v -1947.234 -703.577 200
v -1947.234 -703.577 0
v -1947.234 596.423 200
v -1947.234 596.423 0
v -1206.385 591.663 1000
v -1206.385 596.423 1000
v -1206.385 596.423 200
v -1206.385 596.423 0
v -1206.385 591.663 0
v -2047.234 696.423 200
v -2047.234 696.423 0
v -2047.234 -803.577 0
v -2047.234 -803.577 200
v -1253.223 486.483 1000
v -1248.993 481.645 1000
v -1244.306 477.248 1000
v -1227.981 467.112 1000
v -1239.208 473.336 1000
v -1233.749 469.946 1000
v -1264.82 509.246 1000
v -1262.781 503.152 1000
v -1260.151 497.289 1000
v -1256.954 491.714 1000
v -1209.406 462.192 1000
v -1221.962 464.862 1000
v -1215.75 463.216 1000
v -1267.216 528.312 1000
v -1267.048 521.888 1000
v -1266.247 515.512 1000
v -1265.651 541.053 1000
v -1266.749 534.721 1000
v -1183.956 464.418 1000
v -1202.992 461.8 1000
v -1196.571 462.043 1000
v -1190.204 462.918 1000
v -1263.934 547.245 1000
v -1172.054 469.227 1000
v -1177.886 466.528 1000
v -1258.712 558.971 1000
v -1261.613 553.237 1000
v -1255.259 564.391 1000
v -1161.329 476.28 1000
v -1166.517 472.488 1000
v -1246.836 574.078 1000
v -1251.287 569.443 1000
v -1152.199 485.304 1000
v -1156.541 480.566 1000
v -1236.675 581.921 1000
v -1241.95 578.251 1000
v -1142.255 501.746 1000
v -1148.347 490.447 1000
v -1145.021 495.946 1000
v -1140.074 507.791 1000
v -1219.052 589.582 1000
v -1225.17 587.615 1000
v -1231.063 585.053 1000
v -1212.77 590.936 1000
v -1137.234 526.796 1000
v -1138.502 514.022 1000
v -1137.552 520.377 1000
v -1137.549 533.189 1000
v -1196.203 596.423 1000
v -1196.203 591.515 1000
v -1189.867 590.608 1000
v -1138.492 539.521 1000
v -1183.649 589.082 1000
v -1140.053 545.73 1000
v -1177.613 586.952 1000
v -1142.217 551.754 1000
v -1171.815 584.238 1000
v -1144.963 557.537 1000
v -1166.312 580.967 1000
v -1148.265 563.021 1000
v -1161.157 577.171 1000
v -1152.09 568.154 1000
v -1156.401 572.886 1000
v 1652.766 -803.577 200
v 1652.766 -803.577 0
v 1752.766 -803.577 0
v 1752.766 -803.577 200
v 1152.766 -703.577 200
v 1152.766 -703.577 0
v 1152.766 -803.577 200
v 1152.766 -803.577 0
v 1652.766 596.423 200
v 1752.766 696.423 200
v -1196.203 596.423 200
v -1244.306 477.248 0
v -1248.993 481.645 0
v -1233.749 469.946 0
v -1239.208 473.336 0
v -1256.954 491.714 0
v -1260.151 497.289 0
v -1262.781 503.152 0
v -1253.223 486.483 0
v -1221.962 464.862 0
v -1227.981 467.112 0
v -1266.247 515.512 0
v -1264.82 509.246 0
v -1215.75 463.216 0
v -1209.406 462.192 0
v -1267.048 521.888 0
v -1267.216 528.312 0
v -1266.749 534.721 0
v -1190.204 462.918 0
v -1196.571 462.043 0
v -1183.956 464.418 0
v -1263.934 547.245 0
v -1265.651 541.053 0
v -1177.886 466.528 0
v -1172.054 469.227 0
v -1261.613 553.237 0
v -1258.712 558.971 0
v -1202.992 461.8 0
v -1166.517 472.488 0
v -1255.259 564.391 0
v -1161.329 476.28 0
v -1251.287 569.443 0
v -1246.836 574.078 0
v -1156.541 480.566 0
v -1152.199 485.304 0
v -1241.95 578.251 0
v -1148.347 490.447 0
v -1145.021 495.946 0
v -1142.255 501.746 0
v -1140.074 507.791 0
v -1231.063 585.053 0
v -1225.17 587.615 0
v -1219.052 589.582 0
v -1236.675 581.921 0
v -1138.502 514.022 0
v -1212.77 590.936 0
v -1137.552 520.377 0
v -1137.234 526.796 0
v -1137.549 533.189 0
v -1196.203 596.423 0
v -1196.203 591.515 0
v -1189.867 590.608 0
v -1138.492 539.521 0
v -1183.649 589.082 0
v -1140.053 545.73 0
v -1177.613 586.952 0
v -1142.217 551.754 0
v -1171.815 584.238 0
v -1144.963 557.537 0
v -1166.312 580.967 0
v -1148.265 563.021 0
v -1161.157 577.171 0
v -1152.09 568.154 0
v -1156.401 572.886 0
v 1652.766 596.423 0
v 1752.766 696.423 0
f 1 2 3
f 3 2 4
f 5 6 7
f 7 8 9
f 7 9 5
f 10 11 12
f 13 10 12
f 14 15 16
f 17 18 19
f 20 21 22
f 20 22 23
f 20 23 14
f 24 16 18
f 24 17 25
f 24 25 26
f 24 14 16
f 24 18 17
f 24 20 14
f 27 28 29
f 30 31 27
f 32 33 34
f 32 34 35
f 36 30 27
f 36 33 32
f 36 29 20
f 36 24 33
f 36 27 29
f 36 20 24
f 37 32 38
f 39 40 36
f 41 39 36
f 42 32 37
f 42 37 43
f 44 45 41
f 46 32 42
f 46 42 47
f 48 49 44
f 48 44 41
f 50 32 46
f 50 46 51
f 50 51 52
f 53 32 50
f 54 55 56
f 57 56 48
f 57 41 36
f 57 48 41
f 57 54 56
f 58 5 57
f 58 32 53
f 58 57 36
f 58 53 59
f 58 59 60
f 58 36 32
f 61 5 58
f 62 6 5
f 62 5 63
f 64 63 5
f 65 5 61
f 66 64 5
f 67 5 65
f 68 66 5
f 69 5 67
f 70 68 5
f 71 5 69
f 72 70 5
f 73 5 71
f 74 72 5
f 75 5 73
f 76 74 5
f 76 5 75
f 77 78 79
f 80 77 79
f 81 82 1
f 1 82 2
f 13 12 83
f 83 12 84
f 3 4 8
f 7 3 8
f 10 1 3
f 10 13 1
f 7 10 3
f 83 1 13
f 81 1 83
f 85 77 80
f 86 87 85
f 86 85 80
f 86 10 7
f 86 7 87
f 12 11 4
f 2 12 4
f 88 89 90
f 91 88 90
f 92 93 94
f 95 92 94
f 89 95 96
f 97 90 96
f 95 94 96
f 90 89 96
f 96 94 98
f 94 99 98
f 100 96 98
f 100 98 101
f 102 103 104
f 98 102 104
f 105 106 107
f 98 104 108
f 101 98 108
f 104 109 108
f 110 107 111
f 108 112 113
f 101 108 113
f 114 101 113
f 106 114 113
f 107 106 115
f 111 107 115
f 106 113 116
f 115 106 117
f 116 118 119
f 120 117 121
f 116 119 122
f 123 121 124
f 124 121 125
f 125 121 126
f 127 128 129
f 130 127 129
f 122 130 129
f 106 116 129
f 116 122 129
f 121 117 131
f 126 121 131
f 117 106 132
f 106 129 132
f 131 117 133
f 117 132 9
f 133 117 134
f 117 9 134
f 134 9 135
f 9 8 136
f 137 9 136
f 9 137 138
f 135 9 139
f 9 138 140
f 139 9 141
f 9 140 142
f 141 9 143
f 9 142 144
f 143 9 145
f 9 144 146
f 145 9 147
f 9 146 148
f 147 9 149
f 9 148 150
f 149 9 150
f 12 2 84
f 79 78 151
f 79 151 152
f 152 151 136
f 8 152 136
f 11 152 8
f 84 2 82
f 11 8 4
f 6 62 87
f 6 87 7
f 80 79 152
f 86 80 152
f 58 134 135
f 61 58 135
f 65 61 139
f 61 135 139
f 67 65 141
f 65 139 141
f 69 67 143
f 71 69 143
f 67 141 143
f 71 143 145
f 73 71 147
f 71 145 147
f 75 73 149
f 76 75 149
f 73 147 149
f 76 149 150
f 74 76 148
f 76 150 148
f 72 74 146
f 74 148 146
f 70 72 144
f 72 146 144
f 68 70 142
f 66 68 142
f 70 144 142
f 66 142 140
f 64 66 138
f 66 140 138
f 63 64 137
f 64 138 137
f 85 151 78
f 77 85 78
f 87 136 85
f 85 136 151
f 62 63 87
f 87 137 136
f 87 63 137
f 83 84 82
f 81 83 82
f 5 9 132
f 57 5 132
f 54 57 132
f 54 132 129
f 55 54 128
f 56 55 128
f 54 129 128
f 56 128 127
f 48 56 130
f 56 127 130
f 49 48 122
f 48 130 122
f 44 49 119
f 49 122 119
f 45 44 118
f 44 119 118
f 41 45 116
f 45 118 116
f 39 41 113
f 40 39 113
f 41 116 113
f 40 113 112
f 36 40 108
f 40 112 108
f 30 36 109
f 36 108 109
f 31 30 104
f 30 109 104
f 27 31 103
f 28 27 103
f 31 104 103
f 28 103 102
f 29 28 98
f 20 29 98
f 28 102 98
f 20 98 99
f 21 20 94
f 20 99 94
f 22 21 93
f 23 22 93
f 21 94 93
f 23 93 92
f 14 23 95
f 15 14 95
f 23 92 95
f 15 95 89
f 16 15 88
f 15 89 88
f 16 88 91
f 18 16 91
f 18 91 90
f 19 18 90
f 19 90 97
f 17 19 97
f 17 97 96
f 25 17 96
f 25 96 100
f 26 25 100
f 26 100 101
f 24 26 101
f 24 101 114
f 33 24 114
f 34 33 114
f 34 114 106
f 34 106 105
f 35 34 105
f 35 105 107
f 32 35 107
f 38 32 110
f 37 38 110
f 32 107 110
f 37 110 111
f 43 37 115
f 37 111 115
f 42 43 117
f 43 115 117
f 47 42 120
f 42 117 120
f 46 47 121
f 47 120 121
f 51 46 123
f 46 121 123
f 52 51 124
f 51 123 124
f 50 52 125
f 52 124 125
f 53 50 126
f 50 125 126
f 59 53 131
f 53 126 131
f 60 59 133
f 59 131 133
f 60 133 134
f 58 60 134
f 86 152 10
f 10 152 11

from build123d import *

# Parameters (mm, degrees)
F1_DEPTH = 200
F2_DEPTH = 1000


with BuildPart() as f1:
    # F0 (on Top) → F1 (new body)
    with BuildSketch(Plane.XY):
        Polygon((-1947.234035, -703.577162), (-1947.234035, 596.422838), (-1206.385482, 596.422838), (-1196.203493, 596.422838), (1652.765965, 596.422838), (1652.765965, -803.577162), (1752.765965, -803.577162), (1752.765965, 696.422838), (-2047.234035, 696.422838), (-2047.234035, -803.577162), (1152.765965, -803.577162), (1152.765965, -703.577162), align=None)
    extrude(amount=F1_DEPTH)

    # F0 (on Top) → F2 (join)
    with BuildSketch(Plane.XY):
        with BuildLine():
            ThreePointArc((-1196.203493, 591.515212), (-1201.291592, 591.788733), (-1206.385482, 591.662857))
            ThreePointArc((-1206.385482, 591.662857), (-1246.704002, 479.388583), (-1137.234035, 526.795566))
            ThreePointArc((-1137.234035, 526.795566), (-1154.187259, 570.573499), (-1196.203493, 591.515212))
        make_face()
        with BuildLine():
            Line((-1196.203493, 596.422838), (-1206.385482, 596.422838))
            Line((-1206.385482, 596.422838), (-1206.385482, 591.662857))
            ThreePointArc((-1206.385482, 591.662857), (-1201.291592, 591.788733), (-1196.203493, 591.515212))
            Line((-1196.203493, 591.515212), (-1196.203493, 596.422838))
        make_face()
    extrude(amount=F2_DEPTH)


solid = f1.part
